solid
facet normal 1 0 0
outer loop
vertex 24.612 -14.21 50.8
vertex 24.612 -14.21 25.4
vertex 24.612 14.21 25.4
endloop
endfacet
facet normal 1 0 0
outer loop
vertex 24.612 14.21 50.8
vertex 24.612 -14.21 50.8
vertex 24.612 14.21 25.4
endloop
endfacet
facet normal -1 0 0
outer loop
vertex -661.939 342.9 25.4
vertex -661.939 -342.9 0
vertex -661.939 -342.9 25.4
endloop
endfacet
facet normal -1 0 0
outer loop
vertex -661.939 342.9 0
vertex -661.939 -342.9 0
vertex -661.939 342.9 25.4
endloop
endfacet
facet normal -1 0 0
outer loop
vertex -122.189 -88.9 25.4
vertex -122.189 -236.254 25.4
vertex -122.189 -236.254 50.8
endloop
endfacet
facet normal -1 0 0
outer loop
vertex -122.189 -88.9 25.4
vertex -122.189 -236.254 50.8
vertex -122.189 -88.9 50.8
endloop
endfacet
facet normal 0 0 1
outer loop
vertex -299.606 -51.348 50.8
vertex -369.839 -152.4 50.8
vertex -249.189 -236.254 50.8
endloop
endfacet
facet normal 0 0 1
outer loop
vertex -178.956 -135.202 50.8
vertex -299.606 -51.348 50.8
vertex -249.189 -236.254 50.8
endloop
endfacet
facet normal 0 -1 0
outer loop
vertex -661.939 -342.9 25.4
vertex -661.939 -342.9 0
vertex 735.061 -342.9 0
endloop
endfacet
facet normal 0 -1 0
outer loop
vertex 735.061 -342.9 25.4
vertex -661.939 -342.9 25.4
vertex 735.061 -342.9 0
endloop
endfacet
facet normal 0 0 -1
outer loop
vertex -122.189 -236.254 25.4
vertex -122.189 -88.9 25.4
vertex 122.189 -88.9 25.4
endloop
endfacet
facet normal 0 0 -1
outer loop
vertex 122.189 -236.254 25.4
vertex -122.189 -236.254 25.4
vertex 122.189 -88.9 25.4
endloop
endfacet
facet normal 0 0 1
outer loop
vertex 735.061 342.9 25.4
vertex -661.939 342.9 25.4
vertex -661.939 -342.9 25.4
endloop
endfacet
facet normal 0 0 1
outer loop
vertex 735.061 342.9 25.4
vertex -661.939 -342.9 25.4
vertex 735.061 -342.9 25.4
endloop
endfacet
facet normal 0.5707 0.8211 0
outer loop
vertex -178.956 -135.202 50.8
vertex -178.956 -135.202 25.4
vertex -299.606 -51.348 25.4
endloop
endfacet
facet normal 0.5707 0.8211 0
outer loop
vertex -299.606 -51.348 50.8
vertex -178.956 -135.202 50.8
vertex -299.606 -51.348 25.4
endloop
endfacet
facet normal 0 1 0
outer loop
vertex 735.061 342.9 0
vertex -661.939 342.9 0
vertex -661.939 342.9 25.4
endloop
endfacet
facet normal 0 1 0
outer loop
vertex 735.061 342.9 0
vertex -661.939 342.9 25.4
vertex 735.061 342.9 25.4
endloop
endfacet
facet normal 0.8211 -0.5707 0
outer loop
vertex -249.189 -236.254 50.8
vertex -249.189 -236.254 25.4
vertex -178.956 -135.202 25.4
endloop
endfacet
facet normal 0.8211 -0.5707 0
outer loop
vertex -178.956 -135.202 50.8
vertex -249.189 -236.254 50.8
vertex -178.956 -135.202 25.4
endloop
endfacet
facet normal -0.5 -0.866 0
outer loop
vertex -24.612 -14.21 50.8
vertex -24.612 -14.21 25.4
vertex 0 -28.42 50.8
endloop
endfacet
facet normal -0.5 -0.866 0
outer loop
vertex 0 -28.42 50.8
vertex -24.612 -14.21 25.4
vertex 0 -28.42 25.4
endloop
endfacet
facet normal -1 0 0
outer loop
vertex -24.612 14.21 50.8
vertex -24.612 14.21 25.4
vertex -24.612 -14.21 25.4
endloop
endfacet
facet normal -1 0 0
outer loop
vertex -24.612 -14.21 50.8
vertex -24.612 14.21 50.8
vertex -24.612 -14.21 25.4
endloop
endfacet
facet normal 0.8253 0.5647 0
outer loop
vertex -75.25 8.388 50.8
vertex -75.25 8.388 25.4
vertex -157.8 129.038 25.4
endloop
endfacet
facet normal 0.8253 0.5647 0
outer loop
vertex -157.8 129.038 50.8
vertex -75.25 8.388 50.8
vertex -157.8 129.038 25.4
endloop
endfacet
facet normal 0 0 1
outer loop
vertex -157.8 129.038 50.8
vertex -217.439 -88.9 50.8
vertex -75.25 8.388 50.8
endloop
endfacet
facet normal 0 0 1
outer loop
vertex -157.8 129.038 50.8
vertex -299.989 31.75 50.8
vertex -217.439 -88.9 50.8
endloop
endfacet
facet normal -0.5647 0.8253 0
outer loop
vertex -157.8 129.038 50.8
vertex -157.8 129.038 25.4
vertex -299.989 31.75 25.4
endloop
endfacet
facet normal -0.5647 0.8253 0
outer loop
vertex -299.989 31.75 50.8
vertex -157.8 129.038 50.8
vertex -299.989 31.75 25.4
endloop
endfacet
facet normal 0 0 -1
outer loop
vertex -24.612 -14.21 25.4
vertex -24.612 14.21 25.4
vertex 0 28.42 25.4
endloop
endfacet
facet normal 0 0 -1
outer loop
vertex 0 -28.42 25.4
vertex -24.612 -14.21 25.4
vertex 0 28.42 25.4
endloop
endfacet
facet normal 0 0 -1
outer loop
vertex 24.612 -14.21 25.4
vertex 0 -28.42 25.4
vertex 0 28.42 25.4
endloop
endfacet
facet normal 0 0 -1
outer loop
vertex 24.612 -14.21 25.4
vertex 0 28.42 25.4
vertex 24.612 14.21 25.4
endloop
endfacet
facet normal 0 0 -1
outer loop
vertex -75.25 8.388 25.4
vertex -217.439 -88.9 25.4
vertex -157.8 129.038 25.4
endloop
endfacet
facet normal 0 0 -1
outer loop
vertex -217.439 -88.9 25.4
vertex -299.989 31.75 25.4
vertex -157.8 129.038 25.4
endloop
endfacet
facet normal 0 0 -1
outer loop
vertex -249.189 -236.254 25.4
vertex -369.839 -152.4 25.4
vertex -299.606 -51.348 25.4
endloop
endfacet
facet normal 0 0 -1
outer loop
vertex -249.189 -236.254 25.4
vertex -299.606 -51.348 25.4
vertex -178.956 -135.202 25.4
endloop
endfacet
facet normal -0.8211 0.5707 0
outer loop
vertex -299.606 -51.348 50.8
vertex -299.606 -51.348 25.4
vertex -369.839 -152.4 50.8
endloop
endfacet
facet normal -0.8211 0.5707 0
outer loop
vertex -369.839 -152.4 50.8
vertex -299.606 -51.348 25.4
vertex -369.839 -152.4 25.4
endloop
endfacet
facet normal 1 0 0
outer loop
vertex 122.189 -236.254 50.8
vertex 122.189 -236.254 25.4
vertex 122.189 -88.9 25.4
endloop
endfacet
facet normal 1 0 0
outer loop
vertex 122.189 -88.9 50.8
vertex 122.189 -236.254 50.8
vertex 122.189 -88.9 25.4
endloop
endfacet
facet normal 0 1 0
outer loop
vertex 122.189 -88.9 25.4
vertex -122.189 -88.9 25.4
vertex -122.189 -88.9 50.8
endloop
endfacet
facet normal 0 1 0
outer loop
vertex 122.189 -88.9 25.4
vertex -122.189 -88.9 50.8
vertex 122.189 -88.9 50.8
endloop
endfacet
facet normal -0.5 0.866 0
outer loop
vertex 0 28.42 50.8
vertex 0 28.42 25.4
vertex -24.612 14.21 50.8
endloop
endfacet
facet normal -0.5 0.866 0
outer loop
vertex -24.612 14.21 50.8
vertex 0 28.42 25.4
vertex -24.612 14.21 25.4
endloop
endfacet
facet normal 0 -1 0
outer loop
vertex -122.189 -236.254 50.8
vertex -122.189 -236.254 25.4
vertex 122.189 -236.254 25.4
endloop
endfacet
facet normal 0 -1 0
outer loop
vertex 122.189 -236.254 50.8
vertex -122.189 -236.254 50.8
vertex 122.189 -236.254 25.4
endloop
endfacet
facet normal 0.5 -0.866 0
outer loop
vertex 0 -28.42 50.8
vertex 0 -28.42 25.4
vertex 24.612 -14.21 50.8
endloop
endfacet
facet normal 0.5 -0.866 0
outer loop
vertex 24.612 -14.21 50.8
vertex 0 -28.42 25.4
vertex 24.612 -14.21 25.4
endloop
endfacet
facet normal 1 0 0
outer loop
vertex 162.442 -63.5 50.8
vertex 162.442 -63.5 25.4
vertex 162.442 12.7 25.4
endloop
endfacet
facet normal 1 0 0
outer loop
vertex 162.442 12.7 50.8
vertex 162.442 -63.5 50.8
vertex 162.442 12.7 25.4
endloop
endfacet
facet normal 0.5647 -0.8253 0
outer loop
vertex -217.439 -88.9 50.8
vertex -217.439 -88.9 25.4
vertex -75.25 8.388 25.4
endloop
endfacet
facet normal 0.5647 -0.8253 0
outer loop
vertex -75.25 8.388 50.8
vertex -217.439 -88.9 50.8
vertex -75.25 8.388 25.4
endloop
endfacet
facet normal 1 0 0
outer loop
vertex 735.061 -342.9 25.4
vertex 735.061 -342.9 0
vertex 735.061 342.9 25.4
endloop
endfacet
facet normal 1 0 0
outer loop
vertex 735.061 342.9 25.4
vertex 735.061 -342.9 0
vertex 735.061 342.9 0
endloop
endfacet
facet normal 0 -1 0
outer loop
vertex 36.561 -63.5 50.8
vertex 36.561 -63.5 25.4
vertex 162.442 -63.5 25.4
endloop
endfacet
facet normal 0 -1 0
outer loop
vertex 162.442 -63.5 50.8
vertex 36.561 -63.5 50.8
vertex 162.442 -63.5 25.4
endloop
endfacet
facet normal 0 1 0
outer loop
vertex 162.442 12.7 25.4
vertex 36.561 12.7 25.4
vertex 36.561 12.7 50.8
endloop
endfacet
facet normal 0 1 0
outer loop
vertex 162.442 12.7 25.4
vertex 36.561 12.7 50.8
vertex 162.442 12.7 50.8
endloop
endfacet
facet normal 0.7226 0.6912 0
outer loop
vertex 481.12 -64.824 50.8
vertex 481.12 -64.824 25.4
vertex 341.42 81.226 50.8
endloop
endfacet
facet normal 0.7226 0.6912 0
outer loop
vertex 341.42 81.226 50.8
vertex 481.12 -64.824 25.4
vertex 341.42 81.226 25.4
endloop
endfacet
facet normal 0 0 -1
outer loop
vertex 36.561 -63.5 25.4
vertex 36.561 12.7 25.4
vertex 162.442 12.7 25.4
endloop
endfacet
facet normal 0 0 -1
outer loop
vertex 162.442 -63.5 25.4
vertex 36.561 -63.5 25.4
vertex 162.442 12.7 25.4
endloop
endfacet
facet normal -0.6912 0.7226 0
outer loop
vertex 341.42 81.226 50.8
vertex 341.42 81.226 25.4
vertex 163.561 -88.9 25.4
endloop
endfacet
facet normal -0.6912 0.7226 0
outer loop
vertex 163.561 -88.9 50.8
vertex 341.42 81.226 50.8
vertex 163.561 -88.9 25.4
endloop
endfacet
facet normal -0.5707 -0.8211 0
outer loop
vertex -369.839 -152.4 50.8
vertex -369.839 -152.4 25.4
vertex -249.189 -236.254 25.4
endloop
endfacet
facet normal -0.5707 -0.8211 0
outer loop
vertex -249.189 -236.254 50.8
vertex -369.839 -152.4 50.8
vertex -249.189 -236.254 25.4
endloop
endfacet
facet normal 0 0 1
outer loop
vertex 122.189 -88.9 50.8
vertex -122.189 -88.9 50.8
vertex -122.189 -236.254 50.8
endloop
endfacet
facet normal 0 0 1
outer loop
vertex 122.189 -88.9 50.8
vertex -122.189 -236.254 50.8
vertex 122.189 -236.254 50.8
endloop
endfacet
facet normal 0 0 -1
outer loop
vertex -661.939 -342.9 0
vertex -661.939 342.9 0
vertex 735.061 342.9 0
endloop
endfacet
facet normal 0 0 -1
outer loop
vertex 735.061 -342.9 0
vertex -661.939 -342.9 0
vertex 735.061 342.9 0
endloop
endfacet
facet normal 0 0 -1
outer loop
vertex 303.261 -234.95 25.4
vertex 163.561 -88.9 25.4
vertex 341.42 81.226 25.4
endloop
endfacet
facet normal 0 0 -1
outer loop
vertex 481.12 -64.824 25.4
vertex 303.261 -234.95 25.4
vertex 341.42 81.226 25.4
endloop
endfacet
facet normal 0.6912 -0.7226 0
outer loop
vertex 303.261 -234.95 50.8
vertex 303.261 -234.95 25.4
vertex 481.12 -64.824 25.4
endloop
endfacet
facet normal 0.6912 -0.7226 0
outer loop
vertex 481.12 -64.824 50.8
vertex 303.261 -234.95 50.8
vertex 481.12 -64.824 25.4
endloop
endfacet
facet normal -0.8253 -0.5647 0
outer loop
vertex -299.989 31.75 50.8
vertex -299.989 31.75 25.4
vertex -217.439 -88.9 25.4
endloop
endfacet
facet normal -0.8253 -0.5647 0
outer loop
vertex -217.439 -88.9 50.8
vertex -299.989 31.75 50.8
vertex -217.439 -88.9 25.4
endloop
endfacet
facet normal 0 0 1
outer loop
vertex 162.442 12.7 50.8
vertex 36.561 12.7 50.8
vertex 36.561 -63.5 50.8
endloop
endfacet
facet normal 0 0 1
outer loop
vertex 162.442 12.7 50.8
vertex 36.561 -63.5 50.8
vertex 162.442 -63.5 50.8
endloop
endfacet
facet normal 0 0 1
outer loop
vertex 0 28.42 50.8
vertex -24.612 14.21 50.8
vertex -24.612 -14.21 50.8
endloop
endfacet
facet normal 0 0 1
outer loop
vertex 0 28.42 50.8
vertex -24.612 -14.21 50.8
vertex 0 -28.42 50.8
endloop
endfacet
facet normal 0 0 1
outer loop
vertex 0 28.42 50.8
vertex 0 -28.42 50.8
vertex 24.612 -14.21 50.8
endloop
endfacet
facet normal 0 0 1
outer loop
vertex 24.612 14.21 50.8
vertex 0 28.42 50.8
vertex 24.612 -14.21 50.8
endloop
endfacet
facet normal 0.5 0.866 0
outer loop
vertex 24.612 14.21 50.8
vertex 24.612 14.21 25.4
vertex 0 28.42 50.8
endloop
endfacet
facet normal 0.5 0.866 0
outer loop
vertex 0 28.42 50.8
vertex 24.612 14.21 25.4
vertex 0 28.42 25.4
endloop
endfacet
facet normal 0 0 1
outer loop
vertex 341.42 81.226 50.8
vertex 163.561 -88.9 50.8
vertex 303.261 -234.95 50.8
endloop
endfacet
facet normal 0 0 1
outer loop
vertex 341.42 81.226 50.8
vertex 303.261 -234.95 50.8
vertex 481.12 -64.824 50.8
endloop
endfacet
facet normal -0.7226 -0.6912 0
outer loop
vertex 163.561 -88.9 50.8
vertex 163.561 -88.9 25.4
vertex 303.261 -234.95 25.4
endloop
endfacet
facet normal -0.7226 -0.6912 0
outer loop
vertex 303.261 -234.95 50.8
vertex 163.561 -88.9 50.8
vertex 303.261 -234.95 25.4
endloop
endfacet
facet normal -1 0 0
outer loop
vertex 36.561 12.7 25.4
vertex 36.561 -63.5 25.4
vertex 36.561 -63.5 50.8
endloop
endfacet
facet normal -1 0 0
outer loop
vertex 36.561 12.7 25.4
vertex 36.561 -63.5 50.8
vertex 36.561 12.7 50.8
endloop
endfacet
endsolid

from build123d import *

# Parameters (mm, degrees)
F0_W     = 1397
F0_H     = 685.8
F1_DEPTH = 25.4
F2_W     = 244.378712
F2_H     = 147.354192
F2_W_2   = 125.881126
F2_H_2   = 76.2
F3_DEPTH = 25.4


with BuildPart() as f1:
    # F0 (on Top) → F1 (new body)
    with BuildSketch(Plane.XY):
        with Locations((36.560644, 0)):
            Rectangle(F0_W, F0_H)
    extrude(amount=F1_DEPTH)


with BuildPart() as f3:
    # F2 (on face) → F3 (new body)
    with BuildSketch(Plane.XY.offset(25.4)):
        with Locations((0, -162.577096)):
            Rectangle(F2_W, F2_H)
        Polygon((163.560644, -88.9), (303.260644, -234.95), (481.120072, -64.823591), (341.420072, 81.226409), align=None)
        Polygon((-217.439356, -88.9), (-75.24987, 8.387543), (-157.79987, 129.037543), (-299.989356, 31.75), align=None)
        Polygon((-249.189356, -236.254192), (-178.956088, -135.202072), (-299.606088, -51.347881), (-369.839356, -152.4), align=None)
        Polygon((24.612389, -14.20997), (24.612389, 14.20997), (0, 28.419939), (-24.612389, 14.20997), (-24.612389, -14.20997), (0, -28.419939), align=None)
        with Locations((99.501207, -25.4)):
            Rectangle(F2_W_2, F2_H_2)
    extrude(amount=F3_DEPTH)


solid = Compound([f1.part, f3.part])
